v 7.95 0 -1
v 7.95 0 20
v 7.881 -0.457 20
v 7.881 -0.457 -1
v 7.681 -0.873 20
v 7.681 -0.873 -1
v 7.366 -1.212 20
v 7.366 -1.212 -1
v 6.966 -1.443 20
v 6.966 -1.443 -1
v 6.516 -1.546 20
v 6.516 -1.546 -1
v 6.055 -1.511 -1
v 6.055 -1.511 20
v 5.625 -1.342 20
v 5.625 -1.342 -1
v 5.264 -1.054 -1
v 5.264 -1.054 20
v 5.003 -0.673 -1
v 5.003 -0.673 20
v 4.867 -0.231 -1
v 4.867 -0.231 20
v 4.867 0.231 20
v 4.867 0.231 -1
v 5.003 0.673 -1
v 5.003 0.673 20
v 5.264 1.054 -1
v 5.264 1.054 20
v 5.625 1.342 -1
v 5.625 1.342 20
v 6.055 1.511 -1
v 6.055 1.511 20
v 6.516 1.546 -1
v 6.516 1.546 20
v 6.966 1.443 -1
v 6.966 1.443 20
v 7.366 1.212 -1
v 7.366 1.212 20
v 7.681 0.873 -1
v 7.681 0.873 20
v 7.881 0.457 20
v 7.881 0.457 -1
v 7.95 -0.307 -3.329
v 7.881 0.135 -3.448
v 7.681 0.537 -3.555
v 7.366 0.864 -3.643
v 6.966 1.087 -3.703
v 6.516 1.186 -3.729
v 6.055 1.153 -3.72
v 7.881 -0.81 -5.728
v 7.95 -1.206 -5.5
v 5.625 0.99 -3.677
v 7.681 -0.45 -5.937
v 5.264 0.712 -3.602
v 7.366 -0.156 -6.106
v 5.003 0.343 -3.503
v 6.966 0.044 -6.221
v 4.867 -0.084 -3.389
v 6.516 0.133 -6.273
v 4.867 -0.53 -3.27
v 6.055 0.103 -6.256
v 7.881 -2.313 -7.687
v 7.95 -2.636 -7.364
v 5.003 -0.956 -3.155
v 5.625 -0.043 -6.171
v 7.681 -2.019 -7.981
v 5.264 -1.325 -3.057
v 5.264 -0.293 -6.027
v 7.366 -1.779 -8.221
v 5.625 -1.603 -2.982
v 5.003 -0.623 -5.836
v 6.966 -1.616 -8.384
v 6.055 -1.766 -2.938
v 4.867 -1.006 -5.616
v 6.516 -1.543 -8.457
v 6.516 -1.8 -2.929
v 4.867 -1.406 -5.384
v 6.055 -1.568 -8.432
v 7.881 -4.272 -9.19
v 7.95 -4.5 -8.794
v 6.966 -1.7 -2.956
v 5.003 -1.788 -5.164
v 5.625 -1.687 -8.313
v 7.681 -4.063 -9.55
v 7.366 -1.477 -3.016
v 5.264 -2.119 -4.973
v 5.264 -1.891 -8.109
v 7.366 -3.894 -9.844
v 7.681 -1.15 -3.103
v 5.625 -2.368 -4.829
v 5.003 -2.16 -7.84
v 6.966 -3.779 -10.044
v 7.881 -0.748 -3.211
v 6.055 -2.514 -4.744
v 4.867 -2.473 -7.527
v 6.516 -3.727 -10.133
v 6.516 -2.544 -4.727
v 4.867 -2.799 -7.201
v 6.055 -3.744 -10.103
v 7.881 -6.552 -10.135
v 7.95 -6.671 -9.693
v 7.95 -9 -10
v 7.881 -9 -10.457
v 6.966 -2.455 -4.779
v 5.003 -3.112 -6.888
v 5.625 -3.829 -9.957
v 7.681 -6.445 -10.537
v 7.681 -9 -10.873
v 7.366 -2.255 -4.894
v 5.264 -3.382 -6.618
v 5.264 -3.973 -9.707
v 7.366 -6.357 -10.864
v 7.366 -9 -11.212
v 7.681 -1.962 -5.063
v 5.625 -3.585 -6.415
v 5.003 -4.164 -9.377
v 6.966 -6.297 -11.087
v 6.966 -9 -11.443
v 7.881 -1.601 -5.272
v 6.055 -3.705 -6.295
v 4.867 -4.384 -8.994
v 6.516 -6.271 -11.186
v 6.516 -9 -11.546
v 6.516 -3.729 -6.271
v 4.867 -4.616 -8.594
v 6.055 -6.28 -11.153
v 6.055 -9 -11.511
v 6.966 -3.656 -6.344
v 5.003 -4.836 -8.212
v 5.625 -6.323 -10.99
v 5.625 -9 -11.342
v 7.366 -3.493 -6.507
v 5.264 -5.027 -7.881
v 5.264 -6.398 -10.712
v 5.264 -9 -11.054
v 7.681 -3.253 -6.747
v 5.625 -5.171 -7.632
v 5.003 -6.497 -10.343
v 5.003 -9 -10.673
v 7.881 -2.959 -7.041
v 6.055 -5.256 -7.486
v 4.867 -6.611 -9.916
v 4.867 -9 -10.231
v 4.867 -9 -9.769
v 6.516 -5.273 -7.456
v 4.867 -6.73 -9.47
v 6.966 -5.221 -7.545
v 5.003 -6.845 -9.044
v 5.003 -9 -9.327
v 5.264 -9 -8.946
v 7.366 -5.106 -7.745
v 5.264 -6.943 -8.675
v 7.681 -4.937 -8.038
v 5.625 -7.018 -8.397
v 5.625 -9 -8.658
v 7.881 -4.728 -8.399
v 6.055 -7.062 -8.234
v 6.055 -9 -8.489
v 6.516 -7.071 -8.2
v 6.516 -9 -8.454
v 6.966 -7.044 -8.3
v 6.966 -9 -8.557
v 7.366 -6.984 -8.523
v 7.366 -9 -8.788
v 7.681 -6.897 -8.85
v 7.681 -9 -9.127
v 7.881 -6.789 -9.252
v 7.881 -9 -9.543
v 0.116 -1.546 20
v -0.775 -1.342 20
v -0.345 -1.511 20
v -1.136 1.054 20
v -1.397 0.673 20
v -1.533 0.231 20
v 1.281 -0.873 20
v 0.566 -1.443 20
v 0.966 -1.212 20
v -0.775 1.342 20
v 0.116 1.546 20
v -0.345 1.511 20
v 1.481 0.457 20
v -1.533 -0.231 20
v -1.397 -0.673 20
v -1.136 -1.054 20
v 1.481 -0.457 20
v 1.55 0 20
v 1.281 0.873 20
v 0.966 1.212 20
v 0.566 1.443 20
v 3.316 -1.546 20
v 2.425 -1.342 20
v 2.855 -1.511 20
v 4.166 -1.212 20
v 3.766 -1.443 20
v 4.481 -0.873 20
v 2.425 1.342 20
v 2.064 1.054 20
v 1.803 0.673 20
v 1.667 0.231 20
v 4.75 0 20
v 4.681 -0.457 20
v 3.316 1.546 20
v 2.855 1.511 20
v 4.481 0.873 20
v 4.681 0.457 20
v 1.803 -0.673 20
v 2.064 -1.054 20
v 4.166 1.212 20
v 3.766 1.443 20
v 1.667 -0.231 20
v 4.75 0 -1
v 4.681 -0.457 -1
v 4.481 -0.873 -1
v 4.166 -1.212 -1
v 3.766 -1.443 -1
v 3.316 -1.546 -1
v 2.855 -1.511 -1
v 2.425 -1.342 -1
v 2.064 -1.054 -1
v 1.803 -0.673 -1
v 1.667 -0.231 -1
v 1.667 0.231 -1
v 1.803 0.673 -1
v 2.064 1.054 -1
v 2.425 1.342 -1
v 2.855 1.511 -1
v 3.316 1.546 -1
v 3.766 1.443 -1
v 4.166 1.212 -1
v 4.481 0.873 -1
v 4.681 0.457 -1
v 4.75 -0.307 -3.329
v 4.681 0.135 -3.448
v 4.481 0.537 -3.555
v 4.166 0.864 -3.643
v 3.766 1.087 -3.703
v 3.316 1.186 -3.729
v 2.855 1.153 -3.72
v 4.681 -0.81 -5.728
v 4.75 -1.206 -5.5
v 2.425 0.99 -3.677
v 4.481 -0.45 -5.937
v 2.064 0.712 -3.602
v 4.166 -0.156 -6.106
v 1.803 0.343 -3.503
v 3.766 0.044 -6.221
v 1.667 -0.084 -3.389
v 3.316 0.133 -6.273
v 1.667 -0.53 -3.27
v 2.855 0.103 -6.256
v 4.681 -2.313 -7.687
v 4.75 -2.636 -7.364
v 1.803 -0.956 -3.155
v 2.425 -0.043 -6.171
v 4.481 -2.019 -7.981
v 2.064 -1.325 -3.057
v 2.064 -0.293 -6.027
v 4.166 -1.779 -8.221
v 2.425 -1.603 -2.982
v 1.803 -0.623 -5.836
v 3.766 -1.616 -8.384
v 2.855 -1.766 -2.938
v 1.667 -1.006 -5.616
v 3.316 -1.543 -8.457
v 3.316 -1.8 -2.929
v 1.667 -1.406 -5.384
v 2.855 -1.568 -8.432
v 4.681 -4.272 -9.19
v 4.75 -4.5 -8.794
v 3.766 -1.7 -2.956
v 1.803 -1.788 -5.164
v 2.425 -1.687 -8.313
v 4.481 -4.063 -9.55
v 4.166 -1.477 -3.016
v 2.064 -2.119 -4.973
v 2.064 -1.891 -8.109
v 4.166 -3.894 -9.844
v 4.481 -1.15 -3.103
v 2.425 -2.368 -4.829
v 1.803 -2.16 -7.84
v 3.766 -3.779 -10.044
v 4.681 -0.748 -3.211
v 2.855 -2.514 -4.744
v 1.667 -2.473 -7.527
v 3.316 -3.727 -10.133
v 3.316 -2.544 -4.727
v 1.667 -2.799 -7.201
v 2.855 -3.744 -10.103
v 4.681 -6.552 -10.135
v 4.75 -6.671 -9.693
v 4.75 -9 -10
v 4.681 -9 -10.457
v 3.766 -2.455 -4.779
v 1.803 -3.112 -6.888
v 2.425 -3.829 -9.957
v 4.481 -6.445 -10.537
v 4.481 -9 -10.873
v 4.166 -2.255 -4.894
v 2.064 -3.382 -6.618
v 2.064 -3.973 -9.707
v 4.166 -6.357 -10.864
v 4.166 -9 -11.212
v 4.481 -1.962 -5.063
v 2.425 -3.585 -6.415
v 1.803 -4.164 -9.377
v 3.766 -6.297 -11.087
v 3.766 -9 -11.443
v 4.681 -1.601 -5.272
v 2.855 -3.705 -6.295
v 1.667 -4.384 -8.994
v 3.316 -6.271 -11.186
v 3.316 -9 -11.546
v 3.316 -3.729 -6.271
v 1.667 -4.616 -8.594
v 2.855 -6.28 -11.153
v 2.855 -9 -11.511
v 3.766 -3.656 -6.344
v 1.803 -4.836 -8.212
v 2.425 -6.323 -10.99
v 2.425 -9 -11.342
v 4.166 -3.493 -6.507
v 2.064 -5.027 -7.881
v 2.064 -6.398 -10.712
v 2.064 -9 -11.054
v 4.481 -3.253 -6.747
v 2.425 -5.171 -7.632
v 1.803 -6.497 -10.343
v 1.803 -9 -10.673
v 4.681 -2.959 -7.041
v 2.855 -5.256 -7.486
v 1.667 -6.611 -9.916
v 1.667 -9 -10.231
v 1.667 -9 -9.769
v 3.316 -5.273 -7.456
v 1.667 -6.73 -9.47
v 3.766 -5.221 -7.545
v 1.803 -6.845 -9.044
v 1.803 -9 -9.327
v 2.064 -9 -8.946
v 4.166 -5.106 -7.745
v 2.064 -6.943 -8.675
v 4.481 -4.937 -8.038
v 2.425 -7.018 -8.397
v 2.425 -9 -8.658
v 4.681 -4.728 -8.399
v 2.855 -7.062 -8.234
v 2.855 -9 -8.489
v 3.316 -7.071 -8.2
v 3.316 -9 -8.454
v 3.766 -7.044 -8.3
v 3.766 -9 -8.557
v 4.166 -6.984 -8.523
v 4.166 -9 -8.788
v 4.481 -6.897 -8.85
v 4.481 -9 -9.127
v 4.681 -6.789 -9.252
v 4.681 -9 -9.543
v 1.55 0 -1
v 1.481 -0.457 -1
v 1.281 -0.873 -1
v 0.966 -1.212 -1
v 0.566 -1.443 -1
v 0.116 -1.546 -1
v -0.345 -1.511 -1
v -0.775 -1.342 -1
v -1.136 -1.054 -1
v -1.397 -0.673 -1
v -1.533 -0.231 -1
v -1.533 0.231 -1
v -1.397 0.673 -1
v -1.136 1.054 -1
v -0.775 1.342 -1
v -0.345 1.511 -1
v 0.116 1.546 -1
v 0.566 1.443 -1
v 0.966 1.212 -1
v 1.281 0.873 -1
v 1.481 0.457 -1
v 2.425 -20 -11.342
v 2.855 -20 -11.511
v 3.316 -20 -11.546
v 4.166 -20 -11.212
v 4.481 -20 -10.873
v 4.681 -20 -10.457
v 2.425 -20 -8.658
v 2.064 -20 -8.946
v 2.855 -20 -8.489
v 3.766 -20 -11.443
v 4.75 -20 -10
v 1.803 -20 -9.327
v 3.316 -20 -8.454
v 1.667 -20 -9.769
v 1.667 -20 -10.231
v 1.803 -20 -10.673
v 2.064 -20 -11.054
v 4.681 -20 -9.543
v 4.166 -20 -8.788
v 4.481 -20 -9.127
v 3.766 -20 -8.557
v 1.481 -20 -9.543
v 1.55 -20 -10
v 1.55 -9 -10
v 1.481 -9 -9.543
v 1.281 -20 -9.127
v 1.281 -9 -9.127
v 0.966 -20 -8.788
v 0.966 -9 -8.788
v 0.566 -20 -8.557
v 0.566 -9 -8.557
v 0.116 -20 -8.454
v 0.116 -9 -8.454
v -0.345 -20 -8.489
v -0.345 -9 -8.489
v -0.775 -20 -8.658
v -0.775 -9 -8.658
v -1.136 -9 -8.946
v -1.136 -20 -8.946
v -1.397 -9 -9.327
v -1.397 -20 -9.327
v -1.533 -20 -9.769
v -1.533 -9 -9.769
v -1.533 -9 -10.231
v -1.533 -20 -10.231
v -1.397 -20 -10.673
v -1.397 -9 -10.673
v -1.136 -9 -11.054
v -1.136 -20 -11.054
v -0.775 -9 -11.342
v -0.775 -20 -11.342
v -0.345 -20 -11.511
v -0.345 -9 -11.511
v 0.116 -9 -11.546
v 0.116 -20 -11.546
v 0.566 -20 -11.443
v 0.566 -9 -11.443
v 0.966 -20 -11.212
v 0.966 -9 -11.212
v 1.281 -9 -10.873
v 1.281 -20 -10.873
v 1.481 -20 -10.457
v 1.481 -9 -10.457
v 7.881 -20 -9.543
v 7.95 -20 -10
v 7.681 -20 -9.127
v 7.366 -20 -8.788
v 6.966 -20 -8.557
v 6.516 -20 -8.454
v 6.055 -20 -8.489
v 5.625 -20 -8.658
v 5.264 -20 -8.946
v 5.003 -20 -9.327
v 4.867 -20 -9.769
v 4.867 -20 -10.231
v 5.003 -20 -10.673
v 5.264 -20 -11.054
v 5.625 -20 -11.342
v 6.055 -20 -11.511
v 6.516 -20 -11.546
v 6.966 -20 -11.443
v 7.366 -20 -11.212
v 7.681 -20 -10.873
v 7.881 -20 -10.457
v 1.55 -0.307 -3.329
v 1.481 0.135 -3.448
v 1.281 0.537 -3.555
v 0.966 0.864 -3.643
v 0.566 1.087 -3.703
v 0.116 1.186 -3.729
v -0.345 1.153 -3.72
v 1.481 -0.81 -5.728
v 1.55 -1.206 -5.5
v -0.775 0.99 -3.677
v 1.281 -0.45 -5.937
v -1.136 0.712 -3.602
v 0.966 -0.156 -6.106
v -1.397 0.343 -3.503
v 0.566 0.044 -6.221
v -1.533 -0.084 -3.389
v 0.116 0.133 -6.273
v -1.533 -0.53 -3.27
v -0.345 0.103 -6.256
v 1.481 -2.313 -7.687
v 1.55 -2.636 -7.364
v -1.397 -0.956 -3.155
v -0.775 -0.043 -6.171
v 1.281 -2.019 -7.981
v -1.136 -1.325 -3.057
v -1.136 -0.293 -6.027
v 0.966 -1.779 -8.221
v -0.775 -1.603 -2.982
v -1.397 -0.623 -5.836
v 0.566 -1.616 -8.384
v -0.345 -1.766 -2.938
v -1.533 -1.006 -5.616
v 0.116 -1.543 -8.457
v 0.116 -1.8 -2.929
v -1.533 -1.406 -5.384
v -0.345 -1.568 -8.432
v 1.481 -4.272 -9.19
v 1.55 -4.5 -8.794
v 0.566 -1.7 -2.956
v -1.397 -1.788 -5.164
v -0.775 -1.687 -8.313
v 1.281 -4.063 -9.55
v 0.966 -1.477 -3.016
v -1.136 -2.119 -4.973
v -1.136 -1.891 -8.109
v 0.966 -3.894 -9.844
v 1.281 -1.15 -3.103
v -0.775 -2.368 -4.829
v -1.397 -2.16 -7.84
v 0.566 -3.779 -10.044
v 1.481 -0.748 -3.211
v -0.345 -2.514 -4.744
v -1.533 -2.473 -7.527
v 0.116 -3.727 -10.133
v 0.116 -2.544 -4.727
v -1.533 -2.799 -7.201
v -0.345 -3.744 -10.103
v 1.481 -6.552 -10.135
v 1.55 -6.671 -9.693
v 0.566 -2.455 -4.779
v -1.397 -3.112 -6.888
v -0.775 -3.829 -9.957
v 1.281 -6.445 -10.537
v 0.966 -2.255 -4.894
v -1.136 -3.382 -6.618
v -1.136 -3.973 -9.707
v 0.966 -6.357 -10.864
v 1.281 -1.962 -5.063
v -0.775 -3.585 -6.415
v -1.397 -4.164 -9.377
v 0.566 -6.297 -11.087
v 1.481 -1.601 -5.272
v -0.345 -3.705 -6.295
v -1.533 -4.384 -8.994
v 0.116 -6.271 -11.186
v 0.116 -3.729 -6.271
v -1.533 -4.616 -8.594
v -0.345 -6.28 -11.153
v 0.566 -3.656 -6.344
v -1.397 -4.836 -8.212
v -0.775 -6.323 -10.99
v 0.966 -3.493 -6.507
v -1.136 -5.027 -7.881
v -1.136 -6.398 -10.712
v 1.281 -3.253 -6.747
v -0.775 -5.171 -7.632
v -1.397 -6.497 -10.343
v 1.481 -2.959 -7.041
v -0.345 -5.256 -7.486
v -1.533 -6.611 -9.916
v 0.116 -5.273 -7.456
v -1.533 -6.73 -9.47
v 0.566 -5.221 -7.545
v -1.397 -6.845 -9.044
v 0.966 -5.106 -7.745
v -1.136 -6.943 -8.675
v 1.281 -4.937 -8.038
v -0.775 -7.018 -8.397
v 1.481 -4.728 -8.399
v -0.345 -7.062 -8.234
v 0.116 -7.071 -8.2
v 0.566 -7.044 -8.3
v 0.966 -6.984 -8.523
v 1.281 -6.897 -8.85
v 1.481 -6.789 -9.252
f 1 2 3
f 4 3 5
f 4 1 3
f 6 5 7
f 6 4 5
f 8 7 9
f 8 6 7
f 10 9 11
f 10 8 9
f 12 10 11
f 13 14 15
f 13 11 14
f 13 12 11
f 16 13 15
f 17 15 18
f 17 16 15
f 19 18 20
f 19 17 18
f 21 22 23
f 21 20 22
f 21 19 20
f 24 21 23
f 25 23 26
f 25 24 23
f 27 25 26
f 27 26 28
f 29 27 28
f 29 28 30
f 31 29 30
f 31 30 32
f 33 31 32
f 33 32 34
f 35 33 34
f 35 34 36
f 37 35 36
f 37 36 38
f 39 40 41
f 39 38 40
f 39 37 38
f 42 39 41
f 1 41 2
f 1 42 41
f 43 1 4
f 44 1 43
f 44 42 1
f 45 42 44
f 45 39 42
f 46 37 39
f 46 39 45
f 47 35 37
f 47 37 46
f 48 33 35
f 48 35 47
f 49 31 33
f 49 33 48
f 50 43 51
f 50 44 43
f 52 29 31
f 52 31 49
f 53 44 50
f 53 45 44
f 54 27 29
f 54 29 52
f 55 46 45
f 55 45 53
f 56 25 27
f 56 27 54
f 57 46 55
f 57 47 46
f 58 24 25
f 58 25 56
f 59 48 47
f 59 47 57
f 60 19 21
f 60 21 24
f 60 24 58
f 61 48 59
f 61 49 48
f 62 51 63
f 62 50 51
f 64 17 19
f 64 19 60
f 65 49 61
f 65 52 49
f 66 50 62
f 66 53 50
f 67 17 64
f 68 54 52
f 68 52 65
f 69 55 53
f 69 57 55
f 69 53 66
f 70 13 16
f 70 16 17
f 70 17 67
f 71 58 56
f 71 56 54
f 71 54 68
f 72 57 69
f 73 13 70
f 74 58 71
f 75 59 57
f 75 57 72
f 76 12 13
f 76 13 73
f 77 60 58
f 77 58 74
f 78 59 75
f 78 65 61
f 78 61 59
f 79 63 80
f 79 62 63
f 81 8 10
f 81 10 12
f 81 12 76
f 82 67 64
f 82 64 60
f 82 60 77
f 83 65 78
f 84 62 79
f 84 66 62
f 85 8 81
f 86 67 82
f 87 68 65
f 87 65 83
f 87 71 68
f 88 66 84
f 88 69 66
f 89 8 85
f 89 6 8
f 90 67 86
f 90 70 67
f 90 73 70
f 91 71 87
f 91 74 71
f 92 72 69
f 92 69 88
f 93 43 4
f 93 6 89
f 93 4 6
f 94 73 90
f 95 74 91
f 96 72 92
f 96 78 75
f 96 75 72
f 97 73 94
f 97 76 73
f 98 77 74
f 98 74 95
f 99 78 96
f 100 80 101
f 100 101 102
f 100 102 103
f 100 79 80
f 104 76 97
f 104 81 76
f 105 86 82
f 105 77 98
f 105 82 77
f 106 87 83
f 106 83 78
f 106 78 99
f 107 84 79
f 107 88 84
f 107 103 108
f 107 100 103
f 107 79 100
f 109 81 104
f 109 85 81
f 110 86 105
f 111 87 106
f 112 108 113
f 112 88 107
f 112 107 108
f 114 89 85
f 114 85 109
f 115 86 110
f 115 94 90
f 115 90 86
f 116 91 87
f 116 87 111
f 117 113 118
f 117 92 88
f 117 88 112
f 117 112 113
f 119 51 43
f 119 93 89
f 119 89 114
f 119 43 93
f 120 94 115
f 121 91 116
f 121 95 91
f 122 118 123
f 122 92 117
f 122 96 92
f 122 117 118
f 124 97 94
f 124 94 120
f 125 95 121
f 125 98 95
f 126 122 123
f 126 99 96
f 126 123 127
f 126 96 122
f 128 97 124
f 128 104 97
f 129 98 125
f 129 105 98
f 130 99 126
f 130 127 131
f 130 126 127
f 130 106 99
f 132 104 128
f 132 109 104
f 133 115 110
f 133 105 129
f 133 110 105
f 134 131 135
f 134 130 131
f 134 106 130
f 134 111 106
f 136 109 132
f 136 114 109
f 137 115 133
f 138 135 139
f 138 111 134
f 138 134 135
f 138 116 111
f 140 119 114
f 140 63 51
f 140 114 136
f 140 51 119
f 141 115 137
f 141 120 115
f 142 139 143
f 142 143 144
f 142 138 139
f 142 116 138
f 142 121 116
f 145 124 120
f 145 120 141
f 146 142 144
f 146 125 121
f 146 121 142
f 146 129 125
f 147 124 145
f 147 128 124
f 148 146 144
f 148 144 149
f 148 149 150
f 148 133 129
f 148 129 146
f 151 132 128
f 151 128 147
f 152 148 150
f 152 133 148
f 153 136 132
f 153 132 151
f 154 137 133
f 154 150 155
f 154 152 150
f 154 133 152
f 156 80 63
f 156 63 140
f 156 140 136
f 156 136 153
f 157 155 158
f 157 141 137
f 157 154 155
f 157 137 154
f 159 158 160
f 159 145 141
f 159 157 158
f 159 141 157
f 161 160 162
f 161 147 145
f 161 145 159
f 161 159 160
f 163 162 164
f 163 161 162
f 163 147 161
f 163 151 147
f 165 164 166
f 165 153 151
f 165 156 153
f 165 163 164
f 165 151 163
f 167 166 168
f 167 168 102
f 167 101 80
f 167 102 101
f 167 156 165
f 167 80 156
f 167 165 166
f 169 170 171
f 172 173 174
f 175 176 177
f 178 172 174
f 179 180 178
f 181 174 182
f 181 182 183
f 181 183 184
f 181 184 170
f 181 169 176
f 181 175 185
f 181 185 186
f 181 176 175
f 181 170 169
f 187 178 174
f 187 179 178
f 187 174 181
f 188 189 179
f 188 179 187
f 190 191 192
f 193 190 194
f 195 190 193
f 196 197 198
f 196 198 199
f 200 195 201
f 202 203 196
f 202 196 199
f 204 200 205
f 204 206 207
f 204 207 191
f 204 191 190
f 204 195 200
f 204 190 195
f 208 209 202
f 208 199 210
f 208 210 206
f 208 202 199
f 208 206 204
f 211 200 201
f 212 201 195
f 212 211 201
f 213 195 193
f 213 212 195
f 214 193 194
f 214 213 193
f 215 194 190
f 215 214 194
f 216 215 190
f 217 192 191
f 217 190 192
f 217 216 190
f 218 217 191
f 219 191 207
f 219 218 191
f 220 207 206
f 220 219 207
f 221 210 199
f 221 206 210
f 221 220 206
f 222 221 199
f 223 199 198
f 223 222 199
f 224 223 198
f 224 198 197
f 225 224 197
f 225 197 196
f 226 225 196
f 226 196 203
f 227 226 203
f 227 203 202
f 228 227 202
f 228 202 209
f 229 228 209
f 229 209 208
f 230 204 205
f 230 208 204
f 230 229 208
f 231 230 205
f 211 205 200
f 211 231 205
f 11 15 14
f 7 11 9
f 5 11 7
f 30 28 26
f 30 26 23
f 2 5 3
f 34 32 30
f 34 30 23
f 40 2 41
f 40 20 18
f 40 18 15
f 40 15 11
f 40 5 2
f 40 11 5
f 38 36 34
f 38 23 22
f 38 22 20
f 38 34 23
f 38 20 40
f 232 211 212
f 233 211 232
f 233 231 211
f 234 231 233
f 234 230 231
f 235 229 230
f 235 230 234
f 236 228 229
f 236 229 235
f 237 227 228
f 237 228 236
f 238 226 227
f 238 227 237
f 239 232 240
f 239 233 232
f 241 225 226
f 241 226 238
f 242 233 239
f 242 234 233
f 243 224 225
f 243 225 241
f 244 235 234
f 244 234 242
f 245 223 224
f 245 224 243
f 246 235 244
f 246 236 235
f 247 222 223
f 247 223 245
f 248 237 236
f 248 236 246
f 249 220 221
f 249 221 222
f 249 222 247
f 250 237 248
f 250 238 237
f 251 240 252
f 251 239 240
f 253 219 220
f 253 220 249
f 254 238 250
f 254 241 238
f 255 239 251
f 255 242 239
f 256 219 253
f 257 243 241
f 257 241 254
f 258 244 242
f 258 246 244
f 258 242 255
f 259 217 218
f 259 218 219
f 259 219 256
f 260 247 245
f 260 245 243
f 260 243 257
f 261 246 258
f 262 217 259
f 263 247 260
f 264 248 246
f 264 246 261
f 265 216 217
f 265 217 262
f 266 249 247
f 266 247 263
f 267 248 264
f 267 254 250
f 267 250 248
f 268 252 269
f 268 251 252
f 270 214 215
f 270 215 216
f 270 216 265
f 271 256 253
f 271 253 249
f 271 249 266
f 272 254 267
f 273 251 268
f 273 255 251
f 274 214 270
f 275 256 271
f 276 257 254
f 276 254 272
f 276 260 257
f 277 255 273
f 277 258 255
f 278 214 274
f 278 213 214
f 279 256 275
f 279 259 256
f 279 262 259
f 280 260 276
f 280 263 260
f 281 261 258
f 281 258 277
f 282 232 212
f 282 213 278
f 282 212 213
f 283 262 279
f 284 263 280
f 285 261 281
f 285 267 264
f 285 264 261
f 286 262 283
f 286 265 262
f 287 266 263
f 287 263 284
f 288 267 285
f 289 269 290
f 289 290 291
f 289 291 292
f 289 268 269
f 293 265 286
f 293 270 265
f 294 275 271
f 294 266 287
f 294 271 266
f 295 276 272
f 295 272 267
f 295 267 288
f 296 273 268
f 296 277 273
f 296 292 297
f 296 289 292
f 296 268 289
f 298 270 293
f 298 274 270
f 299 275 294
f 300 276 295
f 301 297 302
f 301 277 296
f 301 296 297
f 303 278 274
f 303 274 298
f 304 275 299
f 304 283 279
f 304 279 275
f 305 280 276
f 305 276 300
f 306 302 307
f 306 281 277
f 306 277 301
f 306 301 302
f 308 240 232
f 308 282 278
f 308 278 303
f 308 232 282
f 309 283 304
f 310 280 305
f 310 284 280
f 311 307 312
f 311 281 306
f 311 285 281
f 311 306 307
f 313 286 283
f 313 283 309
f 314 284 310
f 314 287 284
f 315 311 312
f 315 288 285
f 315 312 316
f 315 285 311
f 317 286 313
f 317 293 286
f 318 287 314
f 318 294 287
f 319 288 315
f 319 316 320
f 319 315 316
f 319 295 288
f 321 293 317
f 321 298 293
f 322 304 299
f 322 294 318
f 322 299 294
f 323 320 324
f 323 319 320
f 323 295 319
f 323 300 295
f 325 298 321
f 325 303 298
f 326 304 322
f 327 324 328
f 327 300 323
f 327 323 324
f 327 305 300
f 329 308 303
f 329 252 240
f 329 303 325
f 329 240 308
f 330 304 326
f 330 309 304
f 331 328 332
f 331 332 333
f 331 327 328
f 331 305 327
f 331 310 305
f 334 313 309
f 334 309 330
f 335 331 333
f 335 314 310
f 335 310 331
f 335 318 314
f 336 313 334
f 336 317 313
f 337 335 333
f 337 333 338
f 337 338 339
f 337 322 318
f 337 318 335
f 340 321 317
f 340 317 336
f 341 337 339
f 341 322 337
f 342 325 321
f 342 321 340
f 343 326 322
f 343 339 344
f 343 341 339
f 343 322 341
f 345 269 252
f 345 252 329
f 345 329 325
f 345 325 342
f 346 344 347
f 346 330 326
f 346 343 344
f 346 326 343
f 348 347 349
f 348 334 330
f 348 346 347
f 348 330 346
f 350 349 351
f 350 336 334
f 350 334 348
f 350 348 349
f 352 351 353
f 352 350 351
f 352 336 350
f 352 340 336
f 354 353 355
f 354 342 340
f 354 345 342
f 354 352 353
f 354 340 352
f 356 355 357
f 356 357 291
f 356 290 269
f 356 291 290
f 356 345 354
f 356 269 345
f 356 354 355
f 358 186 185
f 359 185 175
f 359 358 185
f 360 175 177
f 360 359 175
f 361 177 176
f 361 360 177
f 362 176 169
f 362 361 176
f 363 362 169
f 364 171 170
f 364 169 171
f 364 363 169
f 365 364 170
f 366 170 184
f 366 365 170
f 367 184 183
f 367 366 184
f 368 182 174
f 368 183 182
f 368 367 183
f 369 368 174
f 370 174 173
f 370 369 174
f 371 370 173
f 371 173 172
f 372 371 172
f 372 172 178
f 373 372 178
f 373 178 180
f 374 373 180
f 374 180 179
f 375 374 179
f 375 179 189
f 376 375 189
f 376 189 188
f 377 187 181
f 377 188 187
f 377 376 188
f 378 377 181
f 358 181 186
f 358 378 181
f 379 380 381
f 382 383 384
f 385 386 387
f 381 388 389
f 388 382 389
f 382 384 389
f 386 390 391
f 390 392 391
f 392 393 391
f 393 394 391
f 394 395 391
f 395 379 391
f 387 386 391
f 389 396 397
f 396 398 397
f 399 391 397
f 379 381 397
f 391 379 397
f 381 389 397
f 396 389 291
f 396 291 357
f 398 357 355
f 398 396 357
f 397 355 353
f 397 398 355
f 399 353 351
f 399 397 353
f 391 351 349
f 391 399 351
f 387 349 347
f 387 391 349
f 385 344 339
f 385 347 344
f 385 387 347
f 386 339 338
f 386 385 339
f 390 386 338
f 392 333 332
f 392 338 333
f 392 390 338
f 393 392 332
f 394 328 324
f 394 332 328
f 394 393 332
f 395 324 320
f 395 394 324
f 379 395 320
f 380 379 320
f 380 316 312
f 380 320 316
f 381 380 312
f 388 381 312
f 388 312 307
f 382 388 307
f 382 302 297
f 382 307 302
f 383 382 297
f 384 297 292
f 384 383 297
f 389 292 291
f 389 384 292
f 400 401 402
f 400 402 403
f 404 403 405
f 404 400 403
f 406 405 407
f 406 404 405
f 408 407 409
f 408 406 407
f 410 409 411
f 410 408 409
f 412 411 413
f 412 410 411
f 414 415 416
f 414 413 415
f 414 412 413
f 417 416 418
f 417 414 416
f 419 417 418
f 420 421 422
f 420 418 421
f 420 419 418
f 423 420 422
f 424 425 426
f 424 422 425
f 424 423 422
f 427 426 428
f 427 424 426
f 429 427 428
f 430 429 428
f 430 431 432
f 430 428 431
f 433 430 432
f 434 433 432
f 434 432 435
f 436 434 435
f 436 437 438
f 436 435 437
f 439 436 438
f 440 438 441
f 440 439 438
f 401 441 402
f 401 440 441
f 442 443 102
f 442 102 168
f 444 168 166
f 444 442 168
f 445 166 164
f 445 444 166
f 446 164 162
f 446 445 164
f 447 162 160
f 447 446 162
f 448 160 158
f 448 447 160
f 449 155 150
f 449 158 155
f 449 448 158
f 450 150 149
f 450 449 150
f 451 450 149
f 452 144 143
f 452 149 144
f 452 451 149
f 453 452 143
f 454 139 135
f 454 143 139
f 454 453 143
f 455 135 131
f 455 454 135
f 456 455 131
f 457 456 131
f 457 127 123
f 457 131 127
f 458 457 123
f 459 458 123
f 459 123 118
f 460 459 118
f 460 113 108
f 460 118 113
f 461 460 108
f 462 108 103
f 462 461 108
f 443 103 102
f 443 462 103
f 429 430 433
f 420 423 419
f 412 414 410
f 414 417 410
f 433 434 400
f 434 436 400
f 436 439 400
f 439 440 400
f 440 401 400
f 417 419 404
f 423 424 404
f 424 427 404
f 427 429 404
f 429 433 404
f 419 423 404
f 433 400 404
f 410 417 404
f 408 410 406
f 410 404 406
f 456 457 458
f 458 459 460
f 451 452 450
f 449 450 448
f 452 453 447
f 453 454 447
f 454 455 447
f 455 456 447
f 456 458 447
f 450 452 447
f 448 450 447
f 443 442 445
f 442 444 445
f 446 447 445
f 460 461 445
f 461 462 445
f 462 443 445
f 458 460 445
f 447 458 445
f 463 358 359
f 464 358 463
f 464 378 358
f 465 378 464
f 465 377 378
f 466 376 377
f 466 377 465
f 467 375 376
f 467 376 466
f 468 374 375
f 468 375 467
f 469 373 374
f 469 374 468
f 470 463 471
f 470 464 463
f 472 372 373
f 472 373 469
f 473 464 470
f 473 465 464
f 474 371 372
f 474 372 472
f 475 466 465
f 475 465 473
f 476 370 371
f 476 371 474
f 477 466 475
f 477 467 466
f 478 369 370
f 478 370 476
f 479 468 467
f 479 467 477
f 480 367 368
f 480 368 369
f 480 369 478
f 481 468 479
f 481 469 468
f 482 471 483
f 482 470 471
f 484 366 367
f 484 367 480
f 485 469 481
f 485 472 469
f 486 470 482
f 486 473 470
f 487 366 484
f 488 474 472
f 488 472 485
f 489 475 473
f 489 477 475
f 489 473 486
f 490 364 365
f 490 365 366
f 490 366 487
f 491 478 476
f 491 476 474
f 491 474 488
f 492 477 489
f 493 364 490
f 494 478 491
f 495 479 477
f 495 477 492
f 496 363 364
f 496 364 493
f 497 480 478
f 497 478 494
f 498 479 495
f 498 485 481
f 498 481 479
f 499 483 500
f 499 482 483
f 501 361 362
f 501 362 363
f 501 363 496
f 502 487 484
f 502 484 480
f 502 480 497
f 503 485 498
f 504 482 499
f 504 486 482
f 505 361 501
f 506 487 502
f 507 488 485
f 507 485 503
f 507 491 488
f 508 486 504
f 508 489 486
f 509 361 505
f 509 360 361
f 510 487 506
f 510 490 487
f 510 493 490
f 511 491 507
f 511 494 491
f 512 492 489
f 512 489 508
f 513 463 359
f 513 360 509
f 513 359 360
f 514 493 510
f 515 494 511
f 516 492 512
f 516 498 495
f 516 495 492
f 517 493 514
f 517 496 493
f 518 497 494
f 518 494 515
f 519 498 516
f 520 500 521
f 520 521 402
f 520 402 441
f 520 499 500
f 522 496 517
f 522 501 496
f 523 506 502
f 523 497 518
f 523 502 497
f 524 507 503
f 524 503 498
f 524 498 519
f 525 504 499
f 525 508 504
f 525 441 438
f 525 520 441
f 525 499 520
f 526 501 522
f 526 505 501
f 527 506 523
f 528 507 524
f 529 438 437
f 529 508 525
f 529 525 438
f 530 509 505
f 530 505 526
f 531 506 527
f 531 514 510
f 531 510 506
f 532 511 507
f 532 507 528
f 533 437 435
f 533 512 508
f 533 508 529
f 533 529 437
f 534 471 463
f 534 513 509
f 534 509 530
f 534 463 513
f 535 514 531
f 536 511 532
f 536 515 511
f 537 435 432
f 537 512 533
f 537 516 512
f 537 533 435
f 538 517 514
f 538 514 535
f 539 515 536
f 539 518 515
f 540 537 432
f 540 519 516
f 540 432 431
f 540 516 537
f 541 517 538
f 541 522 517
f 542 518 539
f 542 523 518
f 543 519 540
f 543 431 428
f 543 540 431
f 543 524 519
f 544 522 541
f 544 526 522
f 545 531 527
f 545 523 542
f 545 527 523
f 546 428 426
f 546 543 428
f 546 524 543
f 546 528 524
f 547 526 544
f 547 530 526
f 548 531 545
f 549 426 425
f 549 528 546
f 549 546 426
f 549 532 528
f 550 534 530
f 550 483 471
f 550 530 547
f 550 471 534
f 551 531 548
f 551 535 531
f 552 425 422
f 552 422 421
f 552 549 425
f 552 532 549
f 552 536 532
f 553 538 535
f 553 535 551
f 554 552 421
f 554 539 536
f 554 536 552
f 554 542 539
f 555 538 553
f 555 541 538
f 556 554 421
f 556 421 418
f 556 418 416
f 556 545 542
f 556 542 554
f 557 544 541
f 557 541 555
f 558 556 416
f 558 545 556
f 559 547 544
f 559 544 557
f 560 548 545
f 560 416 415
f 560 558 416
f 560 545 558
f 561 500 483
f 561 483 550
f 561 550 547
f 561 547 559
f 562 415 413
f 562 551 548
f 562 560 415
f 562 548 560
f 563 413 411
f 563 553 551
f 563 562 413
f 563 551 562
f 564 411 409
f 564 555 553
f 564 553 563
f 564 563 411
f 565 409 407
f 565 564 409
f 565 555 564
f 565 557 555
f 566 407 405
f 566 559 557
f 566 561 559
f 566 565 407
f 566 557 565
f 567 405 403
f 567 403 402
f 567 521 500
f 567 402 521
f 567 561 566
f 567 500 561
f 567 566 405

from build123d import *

# Parameters (mm, degrees)
SKETCH1_R             = 1.55
BOSS_EXTRUDE1_DEPTH   = 20
BOSS_EXTRUDE1_2_DEPTH = 20
BOSS_EXTRUDE1_3_DEPTH = 20
SKETCH2_R             = 1.55


with BuildPart() as part:
    # Sketch1 → Boss-Extrude1 (new body)
    with BuildSketch(Plane.XY):
        Circle(SKETCH1_R)
    extrude(amount=BOSS_EXTRUDE1_DEPTH)



with BuildPart() as body_2:
    # Sketch1 → Boss-Extrude1 2 (new body)
    with BuildSketch(Plane.XY):
        with Locations((3.2, 0)):
            Circle(SKETCH1_R)
    extrude(amount=BOSS_EXTRUDE1_2_DEPTH)


with BuildPart() as body_3:
    # Sketch1 → Boss-Extrude1 3 (new body)
    with BuildSketch(Plane.XY):
        with Locations((6.4, 0)):
            Circle(SKETCH1_R)
    extrude(amount=BOSS_EXTRUDE1_3_DEPTH)


with BuildPart() as part_1:
    add(part.part)

    add(body_2.part)  # Sweep2 merges body 2

    add(body_3.part)  # Sweep2 merges body 3
    # Sweep2: sweep along a path in Sketch3
    with BuildLine(Plane(origin=(0, 0, 0), x_dir=(0, 0, -1), z_dir=(1, 0, 0))) as sweep2_path:
        Line((0, 0), (1, 0))
        ThreePointArc((1, 0), (7.363961031, -2.636038969), (10, -9))
        Line((10, -9), (10, -20))
    # Sketch2 → Sweep2 (sweep)
    with BuildSketch(Plane.XY):
        with Locations((6.4, 0)):
            Circle(SKETCH2_R)
        with Locations((3.2, 0)):
            Circle(SKETCH2_R)
        Circle(SKETCH2_R)
    sweep(path=sweep2_path.line)


solid = part_1.part
